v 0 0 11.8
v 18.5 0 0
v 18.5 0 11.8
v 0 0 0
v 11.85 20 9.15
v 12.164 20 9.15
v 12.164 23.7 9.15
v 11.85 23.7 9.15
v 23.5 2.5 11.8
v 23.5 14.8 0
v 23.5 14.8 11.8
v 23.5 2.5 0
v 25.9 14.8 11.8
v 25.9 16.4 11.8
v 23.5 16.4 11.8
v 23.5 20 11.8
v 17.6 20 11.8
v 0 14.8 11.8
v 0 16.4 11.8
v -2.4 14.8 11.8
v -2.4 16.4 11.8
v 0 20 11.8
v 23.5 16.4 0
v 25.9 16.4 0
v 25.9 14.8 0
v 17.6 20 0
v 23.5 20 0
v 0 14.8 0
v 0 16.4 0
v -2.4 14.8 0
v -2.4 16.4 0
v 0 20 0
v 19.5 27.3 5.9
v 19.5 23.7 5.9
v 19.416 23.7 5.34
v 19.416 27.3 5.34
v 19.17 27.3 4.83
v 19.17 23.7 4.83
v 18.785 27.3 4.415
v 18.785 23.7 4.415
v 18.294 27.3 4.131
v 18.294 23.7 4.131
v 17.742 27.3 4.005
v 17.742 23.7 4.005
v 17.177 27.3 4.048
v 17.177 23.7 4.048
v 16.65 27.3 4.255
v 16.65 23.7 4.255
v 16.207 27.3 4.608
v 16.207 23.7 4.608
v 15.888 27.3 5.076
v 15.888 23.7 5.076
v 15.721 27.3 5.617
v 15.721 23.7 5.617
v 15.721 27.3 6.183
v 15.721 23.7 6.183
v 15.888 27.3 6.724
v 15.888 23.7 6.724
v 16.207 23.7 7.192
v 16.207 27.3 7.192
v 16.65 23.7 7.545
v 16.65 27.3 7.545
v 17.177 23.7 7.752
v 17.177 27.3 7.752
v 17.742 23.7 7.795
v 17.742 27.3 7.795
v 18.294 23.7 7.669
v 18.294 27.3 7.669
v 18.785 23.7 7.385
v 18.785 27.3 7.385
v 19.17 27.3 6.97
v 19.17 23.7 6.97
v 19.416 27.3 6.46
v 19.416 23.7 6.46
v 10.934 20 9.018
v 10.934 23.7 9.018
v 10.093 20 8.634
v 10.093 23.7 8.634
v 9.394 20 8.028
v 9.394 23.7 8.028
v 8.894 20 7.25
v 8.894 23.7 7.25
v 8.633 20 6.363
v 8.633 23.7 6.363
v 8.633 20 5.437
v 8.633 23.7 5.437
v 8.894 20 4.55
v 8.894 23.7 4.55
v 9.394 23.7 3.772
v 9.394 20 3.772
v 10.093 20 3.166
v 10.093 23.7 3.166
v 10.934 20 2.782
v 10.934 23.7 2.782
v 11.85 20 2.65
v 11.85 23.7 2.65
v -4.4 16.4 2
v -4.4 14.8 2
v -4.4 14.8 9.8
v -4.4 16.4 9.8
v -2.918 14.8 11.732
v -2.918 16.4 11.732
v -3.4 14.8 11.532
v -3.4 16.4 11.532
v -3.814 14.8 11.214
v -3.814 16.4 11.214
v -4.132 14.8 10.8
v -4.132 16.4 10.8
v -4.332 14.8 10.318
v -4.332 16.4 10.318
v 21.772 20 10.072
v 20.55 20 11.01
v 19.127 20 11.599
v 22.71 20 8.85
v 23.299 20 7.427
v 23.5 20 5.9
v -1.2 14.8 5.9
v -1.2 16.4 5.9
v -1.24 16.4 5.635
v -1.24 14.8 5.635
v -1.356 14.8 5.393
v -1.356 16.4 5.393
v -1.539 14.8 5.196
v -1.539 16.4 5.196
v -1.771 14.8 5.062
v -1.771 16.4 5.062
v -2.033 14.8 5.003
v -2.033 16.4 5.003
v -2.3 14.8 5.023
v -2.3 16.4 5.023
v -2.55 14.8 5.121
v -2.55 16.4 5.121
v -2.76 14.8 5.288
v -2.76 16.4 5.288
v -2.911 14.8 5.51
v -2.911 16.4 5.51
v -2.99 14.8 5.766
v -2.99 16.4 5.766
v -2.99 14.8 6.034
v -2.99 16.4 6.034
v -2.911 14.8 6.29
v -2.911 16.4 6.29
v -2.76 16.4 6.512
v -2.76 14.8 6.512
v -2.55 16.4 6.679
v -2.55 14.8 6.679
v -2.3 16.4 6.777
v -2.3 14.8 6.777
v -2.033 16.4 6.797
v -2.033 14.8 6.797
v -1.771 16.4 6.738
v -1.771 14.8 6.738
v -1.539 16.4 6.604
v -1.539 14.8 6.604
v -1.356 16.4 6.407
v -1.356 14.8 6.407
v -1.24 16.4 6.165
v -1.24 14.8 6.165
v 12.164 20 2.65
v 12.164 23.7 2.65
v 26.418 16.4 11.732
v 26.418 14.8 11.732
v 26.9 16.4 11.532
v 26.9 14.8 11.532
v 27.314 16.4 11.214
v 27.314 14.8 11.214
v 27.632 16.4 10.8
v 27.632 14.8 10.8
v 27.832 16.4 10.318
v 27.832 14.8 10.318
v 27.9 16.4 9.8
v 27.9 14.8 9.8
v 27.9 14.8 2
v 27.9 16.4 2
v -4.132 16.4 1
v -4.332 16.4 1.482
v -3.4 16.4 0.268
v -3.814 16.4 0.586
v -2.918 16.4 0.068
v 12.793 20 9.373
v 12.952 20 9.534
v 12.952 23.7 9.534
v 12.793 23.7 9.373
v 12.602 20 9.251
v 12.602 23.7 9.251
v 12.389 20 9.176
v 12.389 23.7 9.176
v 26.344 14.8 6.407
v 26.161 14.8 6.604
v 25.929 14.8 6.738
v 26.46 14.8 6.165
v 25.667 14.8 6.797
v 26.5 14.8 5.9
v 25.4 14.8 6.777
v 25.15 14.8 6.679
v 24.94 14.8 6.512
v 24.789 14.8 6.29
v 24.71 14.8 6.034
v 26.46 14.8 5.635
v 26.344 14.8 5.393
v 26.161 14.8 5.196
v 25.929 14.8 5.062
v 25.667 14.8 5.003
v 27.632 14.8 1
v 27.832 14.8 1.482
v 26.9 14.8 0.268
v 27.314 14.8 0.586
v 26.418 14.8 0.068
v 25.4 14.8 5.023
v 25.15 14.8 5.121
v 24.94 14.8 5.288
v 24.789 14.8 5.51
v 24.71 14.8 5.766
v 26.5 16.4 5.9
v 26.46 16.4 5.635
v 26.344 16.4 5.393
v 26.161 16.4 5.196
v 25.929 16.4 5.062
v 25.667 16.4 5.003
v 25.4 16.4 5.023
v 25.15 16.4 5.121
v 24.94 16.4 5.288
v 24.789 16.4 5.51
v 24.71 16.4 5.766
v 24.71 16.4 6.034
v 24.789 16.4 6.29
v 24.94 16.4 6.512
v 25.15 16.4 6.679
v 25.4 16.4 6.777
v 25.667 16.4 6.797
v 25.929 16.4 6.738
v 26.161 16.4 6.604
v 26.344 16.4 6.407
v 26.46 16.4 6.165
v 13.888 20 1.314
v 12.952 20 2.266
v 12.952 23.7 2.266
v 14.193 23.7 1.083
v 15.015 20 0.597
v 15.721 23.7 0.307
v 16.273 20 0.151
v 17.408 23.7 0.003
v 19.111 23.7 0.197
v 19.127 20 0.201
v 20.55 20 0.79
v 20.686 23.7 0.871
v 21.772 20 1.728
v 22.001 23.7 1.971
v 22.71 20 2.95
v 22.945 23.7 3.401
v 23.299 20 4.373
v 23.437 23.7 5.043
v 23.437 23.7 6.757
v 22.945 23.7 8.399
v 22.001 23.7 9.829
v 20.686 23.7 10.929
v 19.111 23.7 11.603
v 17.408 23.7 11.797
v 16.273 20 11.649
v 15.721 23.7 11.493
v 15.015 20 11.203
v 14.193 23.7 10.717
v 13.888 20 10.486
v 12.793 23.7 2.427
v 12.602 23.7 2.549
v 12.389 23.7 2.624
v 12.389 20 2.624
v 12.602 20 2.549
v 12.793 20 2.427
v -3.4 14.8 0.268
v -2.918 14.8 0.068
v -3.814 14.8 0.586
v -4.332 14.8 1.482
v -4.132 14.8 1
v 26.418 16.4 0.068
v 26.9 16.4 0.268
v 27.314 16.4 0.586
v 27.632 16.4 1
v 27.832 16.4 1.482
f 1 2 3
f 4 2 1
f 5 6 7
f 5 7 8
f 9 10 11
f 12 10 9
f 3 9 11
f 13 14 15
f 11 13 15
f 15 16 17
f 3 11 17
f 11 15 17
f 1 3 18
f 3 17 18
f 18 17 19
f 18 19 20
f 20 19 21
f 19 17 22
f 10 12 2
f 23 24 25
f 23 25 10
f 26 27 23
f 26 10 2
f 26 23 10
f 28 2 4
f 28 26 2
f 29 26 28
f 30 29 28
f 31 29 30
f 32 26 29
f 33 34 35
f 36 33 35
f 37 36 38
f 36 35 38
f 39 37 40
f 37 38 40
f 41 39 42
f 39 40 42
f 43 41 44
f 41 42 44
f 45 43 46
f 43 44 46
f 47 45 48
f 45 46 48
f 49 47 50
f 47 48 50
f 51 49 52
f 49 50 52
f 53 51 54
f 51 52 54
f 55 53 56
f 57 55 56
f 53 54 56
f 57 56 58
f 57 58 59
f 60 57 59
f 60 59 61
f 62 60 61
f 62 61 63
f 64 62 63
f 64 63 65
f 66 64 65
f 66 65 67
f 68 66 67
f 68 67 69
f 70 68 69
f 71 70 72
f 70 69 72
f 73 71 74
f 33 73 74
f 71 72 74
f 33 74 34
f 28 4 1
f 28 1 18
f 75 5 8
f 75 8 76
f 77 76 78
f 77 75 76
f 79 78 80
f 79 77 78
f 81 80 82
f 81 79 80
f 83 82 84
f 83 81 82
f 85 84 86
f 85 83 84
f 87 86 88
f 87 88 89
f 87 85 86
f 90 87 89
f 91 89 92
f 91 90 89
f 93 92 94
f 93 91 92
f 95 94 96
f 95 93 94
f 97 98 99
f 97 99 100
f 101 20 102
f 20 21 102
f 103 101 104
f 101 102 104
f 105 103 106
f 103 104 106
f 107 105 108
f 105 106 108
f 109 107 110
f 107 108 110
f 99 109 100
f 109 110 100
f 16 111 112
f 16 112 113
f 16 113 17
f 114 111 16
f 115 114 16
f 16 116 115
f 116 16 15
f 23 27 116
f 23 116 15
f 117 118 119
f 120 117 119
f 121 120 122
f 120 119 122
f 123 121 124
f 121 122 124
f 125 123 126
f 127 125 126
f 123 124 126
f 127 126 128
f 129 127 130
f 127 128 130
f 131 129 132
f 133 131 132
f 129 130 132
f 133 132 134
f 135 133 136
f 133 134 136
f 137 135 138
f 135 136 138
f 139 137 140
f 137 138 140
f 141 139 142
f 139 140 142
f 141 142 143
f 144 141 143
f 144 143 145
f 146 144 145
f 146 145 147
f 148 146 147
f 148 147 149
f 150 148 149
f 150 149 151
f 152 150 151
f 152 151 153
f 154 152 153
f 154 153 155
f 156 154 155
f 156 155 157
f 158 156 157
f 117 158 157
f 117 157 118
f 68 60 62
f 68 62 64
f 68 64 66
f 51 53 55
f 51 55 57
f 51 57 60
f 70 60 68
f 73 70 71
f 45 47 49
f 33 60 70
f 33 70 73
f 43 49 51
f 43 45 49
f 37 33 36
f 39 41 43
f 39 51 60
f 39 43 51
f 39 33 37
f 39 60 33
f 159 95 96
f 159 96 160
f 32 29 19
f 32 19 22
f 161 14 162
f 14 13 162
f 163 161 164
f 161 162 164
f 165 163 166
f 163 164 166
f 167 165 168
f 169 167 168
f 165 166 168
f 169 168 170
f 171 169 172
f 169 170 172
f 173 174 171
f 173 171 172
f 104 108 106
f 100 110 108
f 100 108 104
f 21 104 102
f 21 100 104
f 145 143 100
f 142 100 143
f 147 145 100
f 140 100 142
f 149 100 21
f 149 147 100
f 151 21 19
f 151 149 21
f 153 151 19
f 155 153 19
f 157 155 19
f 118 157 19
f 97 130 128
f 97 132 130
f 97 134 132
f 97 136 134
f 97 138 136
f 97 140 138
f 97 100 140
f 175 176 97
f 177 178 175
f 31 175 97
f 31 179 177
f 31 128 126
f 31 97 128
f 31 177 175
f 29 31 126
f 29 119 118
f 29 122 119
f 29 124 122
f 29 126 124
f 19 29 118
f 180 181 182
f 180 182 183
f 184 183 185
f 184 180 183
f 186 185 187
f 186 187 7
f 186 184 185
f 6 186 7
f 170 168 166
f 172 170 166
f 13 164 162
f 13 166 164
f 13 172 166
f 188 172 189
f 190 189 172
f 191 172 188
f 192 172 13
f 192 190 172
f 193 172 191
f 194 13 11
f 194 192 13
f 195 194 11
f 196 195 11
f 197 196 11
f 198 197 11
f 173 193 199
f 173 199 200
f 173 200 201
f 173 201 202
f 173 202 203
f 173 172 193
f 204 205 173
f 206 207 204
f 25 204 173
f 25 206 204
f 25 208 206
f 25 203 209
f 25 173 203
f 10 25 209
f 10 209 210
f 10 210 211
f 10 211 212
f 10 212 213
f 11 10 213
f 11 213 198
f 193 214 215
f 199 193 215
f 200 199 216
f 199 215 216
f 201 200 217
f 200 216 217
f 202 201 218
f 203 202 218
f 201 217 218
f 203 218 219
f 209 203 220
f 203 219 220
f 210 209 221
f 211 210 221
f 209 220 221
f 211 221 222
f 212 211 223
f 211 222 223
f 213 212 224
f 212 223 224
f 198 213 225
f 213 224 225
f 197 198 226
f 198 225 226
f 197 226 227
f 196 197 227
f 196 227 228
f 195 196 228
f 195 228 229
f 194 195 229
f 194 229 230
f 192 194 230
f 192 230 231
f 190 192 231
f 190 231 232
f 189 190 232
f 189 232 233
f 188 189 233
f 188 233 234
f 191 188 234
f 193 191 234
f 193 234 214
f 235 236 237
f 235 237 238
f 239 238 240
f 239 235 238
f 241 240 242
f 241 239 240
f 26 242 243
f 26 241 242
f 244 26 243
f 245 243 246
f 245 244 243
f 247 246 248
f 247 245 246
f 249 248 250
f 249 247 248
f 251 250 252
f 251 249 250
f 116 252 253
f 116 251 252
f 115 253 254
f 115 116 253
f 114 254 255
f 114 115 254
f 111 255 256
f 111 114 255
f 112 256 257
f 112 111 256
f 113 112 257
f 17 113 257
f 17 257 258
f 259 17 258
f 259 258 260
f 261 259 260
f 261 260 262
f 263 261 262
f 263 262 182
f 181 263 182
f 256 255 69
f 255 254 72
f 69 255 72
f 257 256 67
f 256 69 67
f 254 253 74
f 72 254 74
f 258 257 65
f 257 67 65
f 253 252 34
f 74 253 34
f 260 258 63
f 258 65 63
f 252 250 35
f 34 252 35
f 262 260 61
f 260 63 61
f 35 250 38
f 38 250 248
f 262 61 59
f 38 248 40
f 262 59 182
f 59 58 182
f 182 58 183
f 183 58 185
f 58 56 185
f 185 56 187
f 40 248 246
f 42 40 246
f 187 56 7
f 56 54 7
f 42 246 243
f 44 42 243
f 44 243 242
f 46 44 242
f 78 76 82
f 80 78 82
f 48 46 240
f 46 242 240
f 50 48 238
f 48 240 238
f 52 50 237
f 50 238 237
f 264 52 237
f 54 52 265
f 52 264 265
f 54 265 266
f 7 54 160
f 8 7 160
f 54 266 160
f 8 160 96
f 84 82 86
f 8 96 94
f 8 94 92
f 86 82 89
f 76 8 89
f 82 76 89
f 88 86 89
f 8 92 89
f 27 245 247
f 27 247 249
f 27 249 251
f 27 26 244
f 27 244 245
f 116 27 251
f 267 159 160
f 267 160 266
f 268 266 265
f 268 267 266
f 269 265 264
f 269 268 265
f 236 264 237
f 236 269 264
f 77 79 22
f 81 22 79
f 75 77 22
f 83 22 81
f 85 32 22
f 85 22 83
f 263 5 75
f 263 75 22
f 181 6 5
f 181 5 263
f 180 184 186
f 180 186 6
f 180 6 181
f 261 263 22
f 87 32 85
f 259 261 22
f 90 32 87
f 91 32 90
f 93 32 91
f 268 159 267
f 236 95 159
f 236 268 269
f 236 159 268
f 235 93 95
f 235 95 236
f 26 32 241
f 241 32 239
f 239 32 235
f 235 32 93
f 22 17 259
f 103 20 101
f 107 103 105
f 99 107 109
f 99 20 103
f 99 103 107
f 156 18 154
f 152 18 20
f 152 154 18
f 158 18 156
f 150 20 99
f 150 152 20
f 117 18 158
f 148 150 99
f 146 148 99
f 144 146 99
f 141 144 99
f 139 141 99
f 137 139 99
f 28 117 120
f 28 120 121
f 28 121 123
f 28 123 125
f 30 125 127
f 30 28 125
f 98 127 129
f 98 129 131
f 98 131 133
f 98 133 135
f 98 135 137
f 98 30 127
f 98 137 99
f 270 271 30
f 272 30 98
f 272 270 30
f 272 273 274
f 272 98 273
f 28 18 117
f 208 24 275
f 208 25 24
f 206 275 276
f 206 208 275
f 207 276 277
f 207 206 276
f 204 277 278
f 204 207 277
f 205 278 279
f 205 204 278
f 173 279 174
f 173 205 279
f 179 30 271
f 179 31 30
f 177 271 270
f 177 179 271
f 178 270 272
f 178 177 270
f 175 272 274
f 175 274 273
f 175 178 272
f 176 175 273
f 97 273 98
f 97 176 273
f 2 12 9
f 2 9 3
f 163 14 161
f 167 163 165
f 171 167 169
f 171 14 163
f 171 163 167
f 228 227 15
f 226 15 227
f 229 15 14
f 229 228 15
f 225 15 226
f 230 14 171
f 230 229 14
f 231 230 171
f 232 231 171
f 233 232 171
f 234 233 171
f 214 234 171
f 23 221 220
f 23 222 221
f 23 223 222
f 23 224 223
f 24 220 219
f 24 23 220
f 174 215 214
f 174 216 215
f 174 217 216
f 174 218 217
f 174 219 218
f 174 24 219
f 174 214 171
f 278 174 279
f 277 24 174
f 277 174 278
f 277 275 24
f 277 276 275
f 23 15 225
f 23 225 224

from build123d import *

# Parameters (mm, degrees)
DODANIE_WYCI_GNI_CIE1_DEPTH = 11.8
SZKIC2_R                    = 0.9
WYTNIJ_WYCI_GNI_CIE1_DEPTH  = 11.8
ZAOKR_GLENIE1_R             = 2
DODANIE_WYCI_GNI_CIE2_DEPTH = 3.7
SZKIC4_R                    = 1.9
DODANIE_WYCI_GNI_CIE3_DEPTH = 3.6


with BuildPart() as part:
    # Szkic1 → Dodanie-wyciągnięcie1 (new body)
    with BuildSketch(Plane.XY):
        Polygon((0, 0), (0, 14.8), (-4.4, 14.8), (-4.4, 16.4), (0, 16.4), (0, 20), (23.5, 20), (23.5, 16.4), (27.9, 16.4), (27.9, 14.8), (23.5, 14.8), (23.5, 2.5), (18.5, 0), align=None)
    extrude(amount=DODANIE_WYCI_GNI_CIE1_DEPTH)

    # Szkic2 → Wytnij-wyciągnięcie1 (cut)
    with BuildSketch(Plane(origin=(0, 16.4, 0), x_dir=(1, 0, 0), z_dir=(0, 1, 0))):
        with Locations((-2.1, -5.9)):
            Circle(SZKIC2_R)
        with Locations((25.6, -5.9)):
            Circle(SZKIC2_R)
    extrude(amount=-WYTNIJ_WYCI_GNI_CIE1_DEPTH, mode=Mode.SUBTRACT)

    # Zaokrąglenie1
    zaokr_glenie1_edges = [part.edges().sort_by_distance(p)[0] for p in [
        (-4.4, 15.6, 0),
        (27.9, 15.6, 0),
        (27.9, 15.6, 11.8),
        (-4.4, 15.6, 11.8),
    ]]
    fillet(zaokr_glenie1_edges, radius=ZAOKR_GLENIE1_R)

    # Szkic3 → Dodanie-wyciągnięcie2 (add)
    with BuildSketch(Plane(origin=(0, 20, 0), x_dir=(1, 0, 0), z_dir=(0, 1, 0))):
        with BuildLine():
            Line((11.85, -2.65), (12.164238784, -2.65))
            ThreePointArc((12.164238784, -2.65), (12.602449904, -2.548872079), (12.952030264, -2.265942029))
            ThreePointArc((12.952030264, -2.265942029), (23.5, -5.9), (12.952030264, -9.534057971))
            ThreePointArc((12.952030264, -9.534057971), (12.602449904, -9.251127921), (12.164238784, -9.15))
            Line((12.164238784, -9.15), (11.85, -9.15))
            ThreePointArc((11.85, -9.15), (8.6, -5.9), (11.85, -2.65))
        make_face()
    extrude(amount=DODANIE_WYCI_GNI_CIE2_DEPTH)

    # Szkic4 → Dodanie-wyciągnięcie3 (add)
    with BuildSketch(Plane(origin=(0, 23.7, 0), x_dir=(1, 0, 0), z_dir=(0, 1, 0))):
        with Locations((17.6, -5.9)):
            Circle(SZKIC4_R)
    extrude(amount=DODANIE_WYCI_GNI_CIE3_DEPTH)


solid = part.part
